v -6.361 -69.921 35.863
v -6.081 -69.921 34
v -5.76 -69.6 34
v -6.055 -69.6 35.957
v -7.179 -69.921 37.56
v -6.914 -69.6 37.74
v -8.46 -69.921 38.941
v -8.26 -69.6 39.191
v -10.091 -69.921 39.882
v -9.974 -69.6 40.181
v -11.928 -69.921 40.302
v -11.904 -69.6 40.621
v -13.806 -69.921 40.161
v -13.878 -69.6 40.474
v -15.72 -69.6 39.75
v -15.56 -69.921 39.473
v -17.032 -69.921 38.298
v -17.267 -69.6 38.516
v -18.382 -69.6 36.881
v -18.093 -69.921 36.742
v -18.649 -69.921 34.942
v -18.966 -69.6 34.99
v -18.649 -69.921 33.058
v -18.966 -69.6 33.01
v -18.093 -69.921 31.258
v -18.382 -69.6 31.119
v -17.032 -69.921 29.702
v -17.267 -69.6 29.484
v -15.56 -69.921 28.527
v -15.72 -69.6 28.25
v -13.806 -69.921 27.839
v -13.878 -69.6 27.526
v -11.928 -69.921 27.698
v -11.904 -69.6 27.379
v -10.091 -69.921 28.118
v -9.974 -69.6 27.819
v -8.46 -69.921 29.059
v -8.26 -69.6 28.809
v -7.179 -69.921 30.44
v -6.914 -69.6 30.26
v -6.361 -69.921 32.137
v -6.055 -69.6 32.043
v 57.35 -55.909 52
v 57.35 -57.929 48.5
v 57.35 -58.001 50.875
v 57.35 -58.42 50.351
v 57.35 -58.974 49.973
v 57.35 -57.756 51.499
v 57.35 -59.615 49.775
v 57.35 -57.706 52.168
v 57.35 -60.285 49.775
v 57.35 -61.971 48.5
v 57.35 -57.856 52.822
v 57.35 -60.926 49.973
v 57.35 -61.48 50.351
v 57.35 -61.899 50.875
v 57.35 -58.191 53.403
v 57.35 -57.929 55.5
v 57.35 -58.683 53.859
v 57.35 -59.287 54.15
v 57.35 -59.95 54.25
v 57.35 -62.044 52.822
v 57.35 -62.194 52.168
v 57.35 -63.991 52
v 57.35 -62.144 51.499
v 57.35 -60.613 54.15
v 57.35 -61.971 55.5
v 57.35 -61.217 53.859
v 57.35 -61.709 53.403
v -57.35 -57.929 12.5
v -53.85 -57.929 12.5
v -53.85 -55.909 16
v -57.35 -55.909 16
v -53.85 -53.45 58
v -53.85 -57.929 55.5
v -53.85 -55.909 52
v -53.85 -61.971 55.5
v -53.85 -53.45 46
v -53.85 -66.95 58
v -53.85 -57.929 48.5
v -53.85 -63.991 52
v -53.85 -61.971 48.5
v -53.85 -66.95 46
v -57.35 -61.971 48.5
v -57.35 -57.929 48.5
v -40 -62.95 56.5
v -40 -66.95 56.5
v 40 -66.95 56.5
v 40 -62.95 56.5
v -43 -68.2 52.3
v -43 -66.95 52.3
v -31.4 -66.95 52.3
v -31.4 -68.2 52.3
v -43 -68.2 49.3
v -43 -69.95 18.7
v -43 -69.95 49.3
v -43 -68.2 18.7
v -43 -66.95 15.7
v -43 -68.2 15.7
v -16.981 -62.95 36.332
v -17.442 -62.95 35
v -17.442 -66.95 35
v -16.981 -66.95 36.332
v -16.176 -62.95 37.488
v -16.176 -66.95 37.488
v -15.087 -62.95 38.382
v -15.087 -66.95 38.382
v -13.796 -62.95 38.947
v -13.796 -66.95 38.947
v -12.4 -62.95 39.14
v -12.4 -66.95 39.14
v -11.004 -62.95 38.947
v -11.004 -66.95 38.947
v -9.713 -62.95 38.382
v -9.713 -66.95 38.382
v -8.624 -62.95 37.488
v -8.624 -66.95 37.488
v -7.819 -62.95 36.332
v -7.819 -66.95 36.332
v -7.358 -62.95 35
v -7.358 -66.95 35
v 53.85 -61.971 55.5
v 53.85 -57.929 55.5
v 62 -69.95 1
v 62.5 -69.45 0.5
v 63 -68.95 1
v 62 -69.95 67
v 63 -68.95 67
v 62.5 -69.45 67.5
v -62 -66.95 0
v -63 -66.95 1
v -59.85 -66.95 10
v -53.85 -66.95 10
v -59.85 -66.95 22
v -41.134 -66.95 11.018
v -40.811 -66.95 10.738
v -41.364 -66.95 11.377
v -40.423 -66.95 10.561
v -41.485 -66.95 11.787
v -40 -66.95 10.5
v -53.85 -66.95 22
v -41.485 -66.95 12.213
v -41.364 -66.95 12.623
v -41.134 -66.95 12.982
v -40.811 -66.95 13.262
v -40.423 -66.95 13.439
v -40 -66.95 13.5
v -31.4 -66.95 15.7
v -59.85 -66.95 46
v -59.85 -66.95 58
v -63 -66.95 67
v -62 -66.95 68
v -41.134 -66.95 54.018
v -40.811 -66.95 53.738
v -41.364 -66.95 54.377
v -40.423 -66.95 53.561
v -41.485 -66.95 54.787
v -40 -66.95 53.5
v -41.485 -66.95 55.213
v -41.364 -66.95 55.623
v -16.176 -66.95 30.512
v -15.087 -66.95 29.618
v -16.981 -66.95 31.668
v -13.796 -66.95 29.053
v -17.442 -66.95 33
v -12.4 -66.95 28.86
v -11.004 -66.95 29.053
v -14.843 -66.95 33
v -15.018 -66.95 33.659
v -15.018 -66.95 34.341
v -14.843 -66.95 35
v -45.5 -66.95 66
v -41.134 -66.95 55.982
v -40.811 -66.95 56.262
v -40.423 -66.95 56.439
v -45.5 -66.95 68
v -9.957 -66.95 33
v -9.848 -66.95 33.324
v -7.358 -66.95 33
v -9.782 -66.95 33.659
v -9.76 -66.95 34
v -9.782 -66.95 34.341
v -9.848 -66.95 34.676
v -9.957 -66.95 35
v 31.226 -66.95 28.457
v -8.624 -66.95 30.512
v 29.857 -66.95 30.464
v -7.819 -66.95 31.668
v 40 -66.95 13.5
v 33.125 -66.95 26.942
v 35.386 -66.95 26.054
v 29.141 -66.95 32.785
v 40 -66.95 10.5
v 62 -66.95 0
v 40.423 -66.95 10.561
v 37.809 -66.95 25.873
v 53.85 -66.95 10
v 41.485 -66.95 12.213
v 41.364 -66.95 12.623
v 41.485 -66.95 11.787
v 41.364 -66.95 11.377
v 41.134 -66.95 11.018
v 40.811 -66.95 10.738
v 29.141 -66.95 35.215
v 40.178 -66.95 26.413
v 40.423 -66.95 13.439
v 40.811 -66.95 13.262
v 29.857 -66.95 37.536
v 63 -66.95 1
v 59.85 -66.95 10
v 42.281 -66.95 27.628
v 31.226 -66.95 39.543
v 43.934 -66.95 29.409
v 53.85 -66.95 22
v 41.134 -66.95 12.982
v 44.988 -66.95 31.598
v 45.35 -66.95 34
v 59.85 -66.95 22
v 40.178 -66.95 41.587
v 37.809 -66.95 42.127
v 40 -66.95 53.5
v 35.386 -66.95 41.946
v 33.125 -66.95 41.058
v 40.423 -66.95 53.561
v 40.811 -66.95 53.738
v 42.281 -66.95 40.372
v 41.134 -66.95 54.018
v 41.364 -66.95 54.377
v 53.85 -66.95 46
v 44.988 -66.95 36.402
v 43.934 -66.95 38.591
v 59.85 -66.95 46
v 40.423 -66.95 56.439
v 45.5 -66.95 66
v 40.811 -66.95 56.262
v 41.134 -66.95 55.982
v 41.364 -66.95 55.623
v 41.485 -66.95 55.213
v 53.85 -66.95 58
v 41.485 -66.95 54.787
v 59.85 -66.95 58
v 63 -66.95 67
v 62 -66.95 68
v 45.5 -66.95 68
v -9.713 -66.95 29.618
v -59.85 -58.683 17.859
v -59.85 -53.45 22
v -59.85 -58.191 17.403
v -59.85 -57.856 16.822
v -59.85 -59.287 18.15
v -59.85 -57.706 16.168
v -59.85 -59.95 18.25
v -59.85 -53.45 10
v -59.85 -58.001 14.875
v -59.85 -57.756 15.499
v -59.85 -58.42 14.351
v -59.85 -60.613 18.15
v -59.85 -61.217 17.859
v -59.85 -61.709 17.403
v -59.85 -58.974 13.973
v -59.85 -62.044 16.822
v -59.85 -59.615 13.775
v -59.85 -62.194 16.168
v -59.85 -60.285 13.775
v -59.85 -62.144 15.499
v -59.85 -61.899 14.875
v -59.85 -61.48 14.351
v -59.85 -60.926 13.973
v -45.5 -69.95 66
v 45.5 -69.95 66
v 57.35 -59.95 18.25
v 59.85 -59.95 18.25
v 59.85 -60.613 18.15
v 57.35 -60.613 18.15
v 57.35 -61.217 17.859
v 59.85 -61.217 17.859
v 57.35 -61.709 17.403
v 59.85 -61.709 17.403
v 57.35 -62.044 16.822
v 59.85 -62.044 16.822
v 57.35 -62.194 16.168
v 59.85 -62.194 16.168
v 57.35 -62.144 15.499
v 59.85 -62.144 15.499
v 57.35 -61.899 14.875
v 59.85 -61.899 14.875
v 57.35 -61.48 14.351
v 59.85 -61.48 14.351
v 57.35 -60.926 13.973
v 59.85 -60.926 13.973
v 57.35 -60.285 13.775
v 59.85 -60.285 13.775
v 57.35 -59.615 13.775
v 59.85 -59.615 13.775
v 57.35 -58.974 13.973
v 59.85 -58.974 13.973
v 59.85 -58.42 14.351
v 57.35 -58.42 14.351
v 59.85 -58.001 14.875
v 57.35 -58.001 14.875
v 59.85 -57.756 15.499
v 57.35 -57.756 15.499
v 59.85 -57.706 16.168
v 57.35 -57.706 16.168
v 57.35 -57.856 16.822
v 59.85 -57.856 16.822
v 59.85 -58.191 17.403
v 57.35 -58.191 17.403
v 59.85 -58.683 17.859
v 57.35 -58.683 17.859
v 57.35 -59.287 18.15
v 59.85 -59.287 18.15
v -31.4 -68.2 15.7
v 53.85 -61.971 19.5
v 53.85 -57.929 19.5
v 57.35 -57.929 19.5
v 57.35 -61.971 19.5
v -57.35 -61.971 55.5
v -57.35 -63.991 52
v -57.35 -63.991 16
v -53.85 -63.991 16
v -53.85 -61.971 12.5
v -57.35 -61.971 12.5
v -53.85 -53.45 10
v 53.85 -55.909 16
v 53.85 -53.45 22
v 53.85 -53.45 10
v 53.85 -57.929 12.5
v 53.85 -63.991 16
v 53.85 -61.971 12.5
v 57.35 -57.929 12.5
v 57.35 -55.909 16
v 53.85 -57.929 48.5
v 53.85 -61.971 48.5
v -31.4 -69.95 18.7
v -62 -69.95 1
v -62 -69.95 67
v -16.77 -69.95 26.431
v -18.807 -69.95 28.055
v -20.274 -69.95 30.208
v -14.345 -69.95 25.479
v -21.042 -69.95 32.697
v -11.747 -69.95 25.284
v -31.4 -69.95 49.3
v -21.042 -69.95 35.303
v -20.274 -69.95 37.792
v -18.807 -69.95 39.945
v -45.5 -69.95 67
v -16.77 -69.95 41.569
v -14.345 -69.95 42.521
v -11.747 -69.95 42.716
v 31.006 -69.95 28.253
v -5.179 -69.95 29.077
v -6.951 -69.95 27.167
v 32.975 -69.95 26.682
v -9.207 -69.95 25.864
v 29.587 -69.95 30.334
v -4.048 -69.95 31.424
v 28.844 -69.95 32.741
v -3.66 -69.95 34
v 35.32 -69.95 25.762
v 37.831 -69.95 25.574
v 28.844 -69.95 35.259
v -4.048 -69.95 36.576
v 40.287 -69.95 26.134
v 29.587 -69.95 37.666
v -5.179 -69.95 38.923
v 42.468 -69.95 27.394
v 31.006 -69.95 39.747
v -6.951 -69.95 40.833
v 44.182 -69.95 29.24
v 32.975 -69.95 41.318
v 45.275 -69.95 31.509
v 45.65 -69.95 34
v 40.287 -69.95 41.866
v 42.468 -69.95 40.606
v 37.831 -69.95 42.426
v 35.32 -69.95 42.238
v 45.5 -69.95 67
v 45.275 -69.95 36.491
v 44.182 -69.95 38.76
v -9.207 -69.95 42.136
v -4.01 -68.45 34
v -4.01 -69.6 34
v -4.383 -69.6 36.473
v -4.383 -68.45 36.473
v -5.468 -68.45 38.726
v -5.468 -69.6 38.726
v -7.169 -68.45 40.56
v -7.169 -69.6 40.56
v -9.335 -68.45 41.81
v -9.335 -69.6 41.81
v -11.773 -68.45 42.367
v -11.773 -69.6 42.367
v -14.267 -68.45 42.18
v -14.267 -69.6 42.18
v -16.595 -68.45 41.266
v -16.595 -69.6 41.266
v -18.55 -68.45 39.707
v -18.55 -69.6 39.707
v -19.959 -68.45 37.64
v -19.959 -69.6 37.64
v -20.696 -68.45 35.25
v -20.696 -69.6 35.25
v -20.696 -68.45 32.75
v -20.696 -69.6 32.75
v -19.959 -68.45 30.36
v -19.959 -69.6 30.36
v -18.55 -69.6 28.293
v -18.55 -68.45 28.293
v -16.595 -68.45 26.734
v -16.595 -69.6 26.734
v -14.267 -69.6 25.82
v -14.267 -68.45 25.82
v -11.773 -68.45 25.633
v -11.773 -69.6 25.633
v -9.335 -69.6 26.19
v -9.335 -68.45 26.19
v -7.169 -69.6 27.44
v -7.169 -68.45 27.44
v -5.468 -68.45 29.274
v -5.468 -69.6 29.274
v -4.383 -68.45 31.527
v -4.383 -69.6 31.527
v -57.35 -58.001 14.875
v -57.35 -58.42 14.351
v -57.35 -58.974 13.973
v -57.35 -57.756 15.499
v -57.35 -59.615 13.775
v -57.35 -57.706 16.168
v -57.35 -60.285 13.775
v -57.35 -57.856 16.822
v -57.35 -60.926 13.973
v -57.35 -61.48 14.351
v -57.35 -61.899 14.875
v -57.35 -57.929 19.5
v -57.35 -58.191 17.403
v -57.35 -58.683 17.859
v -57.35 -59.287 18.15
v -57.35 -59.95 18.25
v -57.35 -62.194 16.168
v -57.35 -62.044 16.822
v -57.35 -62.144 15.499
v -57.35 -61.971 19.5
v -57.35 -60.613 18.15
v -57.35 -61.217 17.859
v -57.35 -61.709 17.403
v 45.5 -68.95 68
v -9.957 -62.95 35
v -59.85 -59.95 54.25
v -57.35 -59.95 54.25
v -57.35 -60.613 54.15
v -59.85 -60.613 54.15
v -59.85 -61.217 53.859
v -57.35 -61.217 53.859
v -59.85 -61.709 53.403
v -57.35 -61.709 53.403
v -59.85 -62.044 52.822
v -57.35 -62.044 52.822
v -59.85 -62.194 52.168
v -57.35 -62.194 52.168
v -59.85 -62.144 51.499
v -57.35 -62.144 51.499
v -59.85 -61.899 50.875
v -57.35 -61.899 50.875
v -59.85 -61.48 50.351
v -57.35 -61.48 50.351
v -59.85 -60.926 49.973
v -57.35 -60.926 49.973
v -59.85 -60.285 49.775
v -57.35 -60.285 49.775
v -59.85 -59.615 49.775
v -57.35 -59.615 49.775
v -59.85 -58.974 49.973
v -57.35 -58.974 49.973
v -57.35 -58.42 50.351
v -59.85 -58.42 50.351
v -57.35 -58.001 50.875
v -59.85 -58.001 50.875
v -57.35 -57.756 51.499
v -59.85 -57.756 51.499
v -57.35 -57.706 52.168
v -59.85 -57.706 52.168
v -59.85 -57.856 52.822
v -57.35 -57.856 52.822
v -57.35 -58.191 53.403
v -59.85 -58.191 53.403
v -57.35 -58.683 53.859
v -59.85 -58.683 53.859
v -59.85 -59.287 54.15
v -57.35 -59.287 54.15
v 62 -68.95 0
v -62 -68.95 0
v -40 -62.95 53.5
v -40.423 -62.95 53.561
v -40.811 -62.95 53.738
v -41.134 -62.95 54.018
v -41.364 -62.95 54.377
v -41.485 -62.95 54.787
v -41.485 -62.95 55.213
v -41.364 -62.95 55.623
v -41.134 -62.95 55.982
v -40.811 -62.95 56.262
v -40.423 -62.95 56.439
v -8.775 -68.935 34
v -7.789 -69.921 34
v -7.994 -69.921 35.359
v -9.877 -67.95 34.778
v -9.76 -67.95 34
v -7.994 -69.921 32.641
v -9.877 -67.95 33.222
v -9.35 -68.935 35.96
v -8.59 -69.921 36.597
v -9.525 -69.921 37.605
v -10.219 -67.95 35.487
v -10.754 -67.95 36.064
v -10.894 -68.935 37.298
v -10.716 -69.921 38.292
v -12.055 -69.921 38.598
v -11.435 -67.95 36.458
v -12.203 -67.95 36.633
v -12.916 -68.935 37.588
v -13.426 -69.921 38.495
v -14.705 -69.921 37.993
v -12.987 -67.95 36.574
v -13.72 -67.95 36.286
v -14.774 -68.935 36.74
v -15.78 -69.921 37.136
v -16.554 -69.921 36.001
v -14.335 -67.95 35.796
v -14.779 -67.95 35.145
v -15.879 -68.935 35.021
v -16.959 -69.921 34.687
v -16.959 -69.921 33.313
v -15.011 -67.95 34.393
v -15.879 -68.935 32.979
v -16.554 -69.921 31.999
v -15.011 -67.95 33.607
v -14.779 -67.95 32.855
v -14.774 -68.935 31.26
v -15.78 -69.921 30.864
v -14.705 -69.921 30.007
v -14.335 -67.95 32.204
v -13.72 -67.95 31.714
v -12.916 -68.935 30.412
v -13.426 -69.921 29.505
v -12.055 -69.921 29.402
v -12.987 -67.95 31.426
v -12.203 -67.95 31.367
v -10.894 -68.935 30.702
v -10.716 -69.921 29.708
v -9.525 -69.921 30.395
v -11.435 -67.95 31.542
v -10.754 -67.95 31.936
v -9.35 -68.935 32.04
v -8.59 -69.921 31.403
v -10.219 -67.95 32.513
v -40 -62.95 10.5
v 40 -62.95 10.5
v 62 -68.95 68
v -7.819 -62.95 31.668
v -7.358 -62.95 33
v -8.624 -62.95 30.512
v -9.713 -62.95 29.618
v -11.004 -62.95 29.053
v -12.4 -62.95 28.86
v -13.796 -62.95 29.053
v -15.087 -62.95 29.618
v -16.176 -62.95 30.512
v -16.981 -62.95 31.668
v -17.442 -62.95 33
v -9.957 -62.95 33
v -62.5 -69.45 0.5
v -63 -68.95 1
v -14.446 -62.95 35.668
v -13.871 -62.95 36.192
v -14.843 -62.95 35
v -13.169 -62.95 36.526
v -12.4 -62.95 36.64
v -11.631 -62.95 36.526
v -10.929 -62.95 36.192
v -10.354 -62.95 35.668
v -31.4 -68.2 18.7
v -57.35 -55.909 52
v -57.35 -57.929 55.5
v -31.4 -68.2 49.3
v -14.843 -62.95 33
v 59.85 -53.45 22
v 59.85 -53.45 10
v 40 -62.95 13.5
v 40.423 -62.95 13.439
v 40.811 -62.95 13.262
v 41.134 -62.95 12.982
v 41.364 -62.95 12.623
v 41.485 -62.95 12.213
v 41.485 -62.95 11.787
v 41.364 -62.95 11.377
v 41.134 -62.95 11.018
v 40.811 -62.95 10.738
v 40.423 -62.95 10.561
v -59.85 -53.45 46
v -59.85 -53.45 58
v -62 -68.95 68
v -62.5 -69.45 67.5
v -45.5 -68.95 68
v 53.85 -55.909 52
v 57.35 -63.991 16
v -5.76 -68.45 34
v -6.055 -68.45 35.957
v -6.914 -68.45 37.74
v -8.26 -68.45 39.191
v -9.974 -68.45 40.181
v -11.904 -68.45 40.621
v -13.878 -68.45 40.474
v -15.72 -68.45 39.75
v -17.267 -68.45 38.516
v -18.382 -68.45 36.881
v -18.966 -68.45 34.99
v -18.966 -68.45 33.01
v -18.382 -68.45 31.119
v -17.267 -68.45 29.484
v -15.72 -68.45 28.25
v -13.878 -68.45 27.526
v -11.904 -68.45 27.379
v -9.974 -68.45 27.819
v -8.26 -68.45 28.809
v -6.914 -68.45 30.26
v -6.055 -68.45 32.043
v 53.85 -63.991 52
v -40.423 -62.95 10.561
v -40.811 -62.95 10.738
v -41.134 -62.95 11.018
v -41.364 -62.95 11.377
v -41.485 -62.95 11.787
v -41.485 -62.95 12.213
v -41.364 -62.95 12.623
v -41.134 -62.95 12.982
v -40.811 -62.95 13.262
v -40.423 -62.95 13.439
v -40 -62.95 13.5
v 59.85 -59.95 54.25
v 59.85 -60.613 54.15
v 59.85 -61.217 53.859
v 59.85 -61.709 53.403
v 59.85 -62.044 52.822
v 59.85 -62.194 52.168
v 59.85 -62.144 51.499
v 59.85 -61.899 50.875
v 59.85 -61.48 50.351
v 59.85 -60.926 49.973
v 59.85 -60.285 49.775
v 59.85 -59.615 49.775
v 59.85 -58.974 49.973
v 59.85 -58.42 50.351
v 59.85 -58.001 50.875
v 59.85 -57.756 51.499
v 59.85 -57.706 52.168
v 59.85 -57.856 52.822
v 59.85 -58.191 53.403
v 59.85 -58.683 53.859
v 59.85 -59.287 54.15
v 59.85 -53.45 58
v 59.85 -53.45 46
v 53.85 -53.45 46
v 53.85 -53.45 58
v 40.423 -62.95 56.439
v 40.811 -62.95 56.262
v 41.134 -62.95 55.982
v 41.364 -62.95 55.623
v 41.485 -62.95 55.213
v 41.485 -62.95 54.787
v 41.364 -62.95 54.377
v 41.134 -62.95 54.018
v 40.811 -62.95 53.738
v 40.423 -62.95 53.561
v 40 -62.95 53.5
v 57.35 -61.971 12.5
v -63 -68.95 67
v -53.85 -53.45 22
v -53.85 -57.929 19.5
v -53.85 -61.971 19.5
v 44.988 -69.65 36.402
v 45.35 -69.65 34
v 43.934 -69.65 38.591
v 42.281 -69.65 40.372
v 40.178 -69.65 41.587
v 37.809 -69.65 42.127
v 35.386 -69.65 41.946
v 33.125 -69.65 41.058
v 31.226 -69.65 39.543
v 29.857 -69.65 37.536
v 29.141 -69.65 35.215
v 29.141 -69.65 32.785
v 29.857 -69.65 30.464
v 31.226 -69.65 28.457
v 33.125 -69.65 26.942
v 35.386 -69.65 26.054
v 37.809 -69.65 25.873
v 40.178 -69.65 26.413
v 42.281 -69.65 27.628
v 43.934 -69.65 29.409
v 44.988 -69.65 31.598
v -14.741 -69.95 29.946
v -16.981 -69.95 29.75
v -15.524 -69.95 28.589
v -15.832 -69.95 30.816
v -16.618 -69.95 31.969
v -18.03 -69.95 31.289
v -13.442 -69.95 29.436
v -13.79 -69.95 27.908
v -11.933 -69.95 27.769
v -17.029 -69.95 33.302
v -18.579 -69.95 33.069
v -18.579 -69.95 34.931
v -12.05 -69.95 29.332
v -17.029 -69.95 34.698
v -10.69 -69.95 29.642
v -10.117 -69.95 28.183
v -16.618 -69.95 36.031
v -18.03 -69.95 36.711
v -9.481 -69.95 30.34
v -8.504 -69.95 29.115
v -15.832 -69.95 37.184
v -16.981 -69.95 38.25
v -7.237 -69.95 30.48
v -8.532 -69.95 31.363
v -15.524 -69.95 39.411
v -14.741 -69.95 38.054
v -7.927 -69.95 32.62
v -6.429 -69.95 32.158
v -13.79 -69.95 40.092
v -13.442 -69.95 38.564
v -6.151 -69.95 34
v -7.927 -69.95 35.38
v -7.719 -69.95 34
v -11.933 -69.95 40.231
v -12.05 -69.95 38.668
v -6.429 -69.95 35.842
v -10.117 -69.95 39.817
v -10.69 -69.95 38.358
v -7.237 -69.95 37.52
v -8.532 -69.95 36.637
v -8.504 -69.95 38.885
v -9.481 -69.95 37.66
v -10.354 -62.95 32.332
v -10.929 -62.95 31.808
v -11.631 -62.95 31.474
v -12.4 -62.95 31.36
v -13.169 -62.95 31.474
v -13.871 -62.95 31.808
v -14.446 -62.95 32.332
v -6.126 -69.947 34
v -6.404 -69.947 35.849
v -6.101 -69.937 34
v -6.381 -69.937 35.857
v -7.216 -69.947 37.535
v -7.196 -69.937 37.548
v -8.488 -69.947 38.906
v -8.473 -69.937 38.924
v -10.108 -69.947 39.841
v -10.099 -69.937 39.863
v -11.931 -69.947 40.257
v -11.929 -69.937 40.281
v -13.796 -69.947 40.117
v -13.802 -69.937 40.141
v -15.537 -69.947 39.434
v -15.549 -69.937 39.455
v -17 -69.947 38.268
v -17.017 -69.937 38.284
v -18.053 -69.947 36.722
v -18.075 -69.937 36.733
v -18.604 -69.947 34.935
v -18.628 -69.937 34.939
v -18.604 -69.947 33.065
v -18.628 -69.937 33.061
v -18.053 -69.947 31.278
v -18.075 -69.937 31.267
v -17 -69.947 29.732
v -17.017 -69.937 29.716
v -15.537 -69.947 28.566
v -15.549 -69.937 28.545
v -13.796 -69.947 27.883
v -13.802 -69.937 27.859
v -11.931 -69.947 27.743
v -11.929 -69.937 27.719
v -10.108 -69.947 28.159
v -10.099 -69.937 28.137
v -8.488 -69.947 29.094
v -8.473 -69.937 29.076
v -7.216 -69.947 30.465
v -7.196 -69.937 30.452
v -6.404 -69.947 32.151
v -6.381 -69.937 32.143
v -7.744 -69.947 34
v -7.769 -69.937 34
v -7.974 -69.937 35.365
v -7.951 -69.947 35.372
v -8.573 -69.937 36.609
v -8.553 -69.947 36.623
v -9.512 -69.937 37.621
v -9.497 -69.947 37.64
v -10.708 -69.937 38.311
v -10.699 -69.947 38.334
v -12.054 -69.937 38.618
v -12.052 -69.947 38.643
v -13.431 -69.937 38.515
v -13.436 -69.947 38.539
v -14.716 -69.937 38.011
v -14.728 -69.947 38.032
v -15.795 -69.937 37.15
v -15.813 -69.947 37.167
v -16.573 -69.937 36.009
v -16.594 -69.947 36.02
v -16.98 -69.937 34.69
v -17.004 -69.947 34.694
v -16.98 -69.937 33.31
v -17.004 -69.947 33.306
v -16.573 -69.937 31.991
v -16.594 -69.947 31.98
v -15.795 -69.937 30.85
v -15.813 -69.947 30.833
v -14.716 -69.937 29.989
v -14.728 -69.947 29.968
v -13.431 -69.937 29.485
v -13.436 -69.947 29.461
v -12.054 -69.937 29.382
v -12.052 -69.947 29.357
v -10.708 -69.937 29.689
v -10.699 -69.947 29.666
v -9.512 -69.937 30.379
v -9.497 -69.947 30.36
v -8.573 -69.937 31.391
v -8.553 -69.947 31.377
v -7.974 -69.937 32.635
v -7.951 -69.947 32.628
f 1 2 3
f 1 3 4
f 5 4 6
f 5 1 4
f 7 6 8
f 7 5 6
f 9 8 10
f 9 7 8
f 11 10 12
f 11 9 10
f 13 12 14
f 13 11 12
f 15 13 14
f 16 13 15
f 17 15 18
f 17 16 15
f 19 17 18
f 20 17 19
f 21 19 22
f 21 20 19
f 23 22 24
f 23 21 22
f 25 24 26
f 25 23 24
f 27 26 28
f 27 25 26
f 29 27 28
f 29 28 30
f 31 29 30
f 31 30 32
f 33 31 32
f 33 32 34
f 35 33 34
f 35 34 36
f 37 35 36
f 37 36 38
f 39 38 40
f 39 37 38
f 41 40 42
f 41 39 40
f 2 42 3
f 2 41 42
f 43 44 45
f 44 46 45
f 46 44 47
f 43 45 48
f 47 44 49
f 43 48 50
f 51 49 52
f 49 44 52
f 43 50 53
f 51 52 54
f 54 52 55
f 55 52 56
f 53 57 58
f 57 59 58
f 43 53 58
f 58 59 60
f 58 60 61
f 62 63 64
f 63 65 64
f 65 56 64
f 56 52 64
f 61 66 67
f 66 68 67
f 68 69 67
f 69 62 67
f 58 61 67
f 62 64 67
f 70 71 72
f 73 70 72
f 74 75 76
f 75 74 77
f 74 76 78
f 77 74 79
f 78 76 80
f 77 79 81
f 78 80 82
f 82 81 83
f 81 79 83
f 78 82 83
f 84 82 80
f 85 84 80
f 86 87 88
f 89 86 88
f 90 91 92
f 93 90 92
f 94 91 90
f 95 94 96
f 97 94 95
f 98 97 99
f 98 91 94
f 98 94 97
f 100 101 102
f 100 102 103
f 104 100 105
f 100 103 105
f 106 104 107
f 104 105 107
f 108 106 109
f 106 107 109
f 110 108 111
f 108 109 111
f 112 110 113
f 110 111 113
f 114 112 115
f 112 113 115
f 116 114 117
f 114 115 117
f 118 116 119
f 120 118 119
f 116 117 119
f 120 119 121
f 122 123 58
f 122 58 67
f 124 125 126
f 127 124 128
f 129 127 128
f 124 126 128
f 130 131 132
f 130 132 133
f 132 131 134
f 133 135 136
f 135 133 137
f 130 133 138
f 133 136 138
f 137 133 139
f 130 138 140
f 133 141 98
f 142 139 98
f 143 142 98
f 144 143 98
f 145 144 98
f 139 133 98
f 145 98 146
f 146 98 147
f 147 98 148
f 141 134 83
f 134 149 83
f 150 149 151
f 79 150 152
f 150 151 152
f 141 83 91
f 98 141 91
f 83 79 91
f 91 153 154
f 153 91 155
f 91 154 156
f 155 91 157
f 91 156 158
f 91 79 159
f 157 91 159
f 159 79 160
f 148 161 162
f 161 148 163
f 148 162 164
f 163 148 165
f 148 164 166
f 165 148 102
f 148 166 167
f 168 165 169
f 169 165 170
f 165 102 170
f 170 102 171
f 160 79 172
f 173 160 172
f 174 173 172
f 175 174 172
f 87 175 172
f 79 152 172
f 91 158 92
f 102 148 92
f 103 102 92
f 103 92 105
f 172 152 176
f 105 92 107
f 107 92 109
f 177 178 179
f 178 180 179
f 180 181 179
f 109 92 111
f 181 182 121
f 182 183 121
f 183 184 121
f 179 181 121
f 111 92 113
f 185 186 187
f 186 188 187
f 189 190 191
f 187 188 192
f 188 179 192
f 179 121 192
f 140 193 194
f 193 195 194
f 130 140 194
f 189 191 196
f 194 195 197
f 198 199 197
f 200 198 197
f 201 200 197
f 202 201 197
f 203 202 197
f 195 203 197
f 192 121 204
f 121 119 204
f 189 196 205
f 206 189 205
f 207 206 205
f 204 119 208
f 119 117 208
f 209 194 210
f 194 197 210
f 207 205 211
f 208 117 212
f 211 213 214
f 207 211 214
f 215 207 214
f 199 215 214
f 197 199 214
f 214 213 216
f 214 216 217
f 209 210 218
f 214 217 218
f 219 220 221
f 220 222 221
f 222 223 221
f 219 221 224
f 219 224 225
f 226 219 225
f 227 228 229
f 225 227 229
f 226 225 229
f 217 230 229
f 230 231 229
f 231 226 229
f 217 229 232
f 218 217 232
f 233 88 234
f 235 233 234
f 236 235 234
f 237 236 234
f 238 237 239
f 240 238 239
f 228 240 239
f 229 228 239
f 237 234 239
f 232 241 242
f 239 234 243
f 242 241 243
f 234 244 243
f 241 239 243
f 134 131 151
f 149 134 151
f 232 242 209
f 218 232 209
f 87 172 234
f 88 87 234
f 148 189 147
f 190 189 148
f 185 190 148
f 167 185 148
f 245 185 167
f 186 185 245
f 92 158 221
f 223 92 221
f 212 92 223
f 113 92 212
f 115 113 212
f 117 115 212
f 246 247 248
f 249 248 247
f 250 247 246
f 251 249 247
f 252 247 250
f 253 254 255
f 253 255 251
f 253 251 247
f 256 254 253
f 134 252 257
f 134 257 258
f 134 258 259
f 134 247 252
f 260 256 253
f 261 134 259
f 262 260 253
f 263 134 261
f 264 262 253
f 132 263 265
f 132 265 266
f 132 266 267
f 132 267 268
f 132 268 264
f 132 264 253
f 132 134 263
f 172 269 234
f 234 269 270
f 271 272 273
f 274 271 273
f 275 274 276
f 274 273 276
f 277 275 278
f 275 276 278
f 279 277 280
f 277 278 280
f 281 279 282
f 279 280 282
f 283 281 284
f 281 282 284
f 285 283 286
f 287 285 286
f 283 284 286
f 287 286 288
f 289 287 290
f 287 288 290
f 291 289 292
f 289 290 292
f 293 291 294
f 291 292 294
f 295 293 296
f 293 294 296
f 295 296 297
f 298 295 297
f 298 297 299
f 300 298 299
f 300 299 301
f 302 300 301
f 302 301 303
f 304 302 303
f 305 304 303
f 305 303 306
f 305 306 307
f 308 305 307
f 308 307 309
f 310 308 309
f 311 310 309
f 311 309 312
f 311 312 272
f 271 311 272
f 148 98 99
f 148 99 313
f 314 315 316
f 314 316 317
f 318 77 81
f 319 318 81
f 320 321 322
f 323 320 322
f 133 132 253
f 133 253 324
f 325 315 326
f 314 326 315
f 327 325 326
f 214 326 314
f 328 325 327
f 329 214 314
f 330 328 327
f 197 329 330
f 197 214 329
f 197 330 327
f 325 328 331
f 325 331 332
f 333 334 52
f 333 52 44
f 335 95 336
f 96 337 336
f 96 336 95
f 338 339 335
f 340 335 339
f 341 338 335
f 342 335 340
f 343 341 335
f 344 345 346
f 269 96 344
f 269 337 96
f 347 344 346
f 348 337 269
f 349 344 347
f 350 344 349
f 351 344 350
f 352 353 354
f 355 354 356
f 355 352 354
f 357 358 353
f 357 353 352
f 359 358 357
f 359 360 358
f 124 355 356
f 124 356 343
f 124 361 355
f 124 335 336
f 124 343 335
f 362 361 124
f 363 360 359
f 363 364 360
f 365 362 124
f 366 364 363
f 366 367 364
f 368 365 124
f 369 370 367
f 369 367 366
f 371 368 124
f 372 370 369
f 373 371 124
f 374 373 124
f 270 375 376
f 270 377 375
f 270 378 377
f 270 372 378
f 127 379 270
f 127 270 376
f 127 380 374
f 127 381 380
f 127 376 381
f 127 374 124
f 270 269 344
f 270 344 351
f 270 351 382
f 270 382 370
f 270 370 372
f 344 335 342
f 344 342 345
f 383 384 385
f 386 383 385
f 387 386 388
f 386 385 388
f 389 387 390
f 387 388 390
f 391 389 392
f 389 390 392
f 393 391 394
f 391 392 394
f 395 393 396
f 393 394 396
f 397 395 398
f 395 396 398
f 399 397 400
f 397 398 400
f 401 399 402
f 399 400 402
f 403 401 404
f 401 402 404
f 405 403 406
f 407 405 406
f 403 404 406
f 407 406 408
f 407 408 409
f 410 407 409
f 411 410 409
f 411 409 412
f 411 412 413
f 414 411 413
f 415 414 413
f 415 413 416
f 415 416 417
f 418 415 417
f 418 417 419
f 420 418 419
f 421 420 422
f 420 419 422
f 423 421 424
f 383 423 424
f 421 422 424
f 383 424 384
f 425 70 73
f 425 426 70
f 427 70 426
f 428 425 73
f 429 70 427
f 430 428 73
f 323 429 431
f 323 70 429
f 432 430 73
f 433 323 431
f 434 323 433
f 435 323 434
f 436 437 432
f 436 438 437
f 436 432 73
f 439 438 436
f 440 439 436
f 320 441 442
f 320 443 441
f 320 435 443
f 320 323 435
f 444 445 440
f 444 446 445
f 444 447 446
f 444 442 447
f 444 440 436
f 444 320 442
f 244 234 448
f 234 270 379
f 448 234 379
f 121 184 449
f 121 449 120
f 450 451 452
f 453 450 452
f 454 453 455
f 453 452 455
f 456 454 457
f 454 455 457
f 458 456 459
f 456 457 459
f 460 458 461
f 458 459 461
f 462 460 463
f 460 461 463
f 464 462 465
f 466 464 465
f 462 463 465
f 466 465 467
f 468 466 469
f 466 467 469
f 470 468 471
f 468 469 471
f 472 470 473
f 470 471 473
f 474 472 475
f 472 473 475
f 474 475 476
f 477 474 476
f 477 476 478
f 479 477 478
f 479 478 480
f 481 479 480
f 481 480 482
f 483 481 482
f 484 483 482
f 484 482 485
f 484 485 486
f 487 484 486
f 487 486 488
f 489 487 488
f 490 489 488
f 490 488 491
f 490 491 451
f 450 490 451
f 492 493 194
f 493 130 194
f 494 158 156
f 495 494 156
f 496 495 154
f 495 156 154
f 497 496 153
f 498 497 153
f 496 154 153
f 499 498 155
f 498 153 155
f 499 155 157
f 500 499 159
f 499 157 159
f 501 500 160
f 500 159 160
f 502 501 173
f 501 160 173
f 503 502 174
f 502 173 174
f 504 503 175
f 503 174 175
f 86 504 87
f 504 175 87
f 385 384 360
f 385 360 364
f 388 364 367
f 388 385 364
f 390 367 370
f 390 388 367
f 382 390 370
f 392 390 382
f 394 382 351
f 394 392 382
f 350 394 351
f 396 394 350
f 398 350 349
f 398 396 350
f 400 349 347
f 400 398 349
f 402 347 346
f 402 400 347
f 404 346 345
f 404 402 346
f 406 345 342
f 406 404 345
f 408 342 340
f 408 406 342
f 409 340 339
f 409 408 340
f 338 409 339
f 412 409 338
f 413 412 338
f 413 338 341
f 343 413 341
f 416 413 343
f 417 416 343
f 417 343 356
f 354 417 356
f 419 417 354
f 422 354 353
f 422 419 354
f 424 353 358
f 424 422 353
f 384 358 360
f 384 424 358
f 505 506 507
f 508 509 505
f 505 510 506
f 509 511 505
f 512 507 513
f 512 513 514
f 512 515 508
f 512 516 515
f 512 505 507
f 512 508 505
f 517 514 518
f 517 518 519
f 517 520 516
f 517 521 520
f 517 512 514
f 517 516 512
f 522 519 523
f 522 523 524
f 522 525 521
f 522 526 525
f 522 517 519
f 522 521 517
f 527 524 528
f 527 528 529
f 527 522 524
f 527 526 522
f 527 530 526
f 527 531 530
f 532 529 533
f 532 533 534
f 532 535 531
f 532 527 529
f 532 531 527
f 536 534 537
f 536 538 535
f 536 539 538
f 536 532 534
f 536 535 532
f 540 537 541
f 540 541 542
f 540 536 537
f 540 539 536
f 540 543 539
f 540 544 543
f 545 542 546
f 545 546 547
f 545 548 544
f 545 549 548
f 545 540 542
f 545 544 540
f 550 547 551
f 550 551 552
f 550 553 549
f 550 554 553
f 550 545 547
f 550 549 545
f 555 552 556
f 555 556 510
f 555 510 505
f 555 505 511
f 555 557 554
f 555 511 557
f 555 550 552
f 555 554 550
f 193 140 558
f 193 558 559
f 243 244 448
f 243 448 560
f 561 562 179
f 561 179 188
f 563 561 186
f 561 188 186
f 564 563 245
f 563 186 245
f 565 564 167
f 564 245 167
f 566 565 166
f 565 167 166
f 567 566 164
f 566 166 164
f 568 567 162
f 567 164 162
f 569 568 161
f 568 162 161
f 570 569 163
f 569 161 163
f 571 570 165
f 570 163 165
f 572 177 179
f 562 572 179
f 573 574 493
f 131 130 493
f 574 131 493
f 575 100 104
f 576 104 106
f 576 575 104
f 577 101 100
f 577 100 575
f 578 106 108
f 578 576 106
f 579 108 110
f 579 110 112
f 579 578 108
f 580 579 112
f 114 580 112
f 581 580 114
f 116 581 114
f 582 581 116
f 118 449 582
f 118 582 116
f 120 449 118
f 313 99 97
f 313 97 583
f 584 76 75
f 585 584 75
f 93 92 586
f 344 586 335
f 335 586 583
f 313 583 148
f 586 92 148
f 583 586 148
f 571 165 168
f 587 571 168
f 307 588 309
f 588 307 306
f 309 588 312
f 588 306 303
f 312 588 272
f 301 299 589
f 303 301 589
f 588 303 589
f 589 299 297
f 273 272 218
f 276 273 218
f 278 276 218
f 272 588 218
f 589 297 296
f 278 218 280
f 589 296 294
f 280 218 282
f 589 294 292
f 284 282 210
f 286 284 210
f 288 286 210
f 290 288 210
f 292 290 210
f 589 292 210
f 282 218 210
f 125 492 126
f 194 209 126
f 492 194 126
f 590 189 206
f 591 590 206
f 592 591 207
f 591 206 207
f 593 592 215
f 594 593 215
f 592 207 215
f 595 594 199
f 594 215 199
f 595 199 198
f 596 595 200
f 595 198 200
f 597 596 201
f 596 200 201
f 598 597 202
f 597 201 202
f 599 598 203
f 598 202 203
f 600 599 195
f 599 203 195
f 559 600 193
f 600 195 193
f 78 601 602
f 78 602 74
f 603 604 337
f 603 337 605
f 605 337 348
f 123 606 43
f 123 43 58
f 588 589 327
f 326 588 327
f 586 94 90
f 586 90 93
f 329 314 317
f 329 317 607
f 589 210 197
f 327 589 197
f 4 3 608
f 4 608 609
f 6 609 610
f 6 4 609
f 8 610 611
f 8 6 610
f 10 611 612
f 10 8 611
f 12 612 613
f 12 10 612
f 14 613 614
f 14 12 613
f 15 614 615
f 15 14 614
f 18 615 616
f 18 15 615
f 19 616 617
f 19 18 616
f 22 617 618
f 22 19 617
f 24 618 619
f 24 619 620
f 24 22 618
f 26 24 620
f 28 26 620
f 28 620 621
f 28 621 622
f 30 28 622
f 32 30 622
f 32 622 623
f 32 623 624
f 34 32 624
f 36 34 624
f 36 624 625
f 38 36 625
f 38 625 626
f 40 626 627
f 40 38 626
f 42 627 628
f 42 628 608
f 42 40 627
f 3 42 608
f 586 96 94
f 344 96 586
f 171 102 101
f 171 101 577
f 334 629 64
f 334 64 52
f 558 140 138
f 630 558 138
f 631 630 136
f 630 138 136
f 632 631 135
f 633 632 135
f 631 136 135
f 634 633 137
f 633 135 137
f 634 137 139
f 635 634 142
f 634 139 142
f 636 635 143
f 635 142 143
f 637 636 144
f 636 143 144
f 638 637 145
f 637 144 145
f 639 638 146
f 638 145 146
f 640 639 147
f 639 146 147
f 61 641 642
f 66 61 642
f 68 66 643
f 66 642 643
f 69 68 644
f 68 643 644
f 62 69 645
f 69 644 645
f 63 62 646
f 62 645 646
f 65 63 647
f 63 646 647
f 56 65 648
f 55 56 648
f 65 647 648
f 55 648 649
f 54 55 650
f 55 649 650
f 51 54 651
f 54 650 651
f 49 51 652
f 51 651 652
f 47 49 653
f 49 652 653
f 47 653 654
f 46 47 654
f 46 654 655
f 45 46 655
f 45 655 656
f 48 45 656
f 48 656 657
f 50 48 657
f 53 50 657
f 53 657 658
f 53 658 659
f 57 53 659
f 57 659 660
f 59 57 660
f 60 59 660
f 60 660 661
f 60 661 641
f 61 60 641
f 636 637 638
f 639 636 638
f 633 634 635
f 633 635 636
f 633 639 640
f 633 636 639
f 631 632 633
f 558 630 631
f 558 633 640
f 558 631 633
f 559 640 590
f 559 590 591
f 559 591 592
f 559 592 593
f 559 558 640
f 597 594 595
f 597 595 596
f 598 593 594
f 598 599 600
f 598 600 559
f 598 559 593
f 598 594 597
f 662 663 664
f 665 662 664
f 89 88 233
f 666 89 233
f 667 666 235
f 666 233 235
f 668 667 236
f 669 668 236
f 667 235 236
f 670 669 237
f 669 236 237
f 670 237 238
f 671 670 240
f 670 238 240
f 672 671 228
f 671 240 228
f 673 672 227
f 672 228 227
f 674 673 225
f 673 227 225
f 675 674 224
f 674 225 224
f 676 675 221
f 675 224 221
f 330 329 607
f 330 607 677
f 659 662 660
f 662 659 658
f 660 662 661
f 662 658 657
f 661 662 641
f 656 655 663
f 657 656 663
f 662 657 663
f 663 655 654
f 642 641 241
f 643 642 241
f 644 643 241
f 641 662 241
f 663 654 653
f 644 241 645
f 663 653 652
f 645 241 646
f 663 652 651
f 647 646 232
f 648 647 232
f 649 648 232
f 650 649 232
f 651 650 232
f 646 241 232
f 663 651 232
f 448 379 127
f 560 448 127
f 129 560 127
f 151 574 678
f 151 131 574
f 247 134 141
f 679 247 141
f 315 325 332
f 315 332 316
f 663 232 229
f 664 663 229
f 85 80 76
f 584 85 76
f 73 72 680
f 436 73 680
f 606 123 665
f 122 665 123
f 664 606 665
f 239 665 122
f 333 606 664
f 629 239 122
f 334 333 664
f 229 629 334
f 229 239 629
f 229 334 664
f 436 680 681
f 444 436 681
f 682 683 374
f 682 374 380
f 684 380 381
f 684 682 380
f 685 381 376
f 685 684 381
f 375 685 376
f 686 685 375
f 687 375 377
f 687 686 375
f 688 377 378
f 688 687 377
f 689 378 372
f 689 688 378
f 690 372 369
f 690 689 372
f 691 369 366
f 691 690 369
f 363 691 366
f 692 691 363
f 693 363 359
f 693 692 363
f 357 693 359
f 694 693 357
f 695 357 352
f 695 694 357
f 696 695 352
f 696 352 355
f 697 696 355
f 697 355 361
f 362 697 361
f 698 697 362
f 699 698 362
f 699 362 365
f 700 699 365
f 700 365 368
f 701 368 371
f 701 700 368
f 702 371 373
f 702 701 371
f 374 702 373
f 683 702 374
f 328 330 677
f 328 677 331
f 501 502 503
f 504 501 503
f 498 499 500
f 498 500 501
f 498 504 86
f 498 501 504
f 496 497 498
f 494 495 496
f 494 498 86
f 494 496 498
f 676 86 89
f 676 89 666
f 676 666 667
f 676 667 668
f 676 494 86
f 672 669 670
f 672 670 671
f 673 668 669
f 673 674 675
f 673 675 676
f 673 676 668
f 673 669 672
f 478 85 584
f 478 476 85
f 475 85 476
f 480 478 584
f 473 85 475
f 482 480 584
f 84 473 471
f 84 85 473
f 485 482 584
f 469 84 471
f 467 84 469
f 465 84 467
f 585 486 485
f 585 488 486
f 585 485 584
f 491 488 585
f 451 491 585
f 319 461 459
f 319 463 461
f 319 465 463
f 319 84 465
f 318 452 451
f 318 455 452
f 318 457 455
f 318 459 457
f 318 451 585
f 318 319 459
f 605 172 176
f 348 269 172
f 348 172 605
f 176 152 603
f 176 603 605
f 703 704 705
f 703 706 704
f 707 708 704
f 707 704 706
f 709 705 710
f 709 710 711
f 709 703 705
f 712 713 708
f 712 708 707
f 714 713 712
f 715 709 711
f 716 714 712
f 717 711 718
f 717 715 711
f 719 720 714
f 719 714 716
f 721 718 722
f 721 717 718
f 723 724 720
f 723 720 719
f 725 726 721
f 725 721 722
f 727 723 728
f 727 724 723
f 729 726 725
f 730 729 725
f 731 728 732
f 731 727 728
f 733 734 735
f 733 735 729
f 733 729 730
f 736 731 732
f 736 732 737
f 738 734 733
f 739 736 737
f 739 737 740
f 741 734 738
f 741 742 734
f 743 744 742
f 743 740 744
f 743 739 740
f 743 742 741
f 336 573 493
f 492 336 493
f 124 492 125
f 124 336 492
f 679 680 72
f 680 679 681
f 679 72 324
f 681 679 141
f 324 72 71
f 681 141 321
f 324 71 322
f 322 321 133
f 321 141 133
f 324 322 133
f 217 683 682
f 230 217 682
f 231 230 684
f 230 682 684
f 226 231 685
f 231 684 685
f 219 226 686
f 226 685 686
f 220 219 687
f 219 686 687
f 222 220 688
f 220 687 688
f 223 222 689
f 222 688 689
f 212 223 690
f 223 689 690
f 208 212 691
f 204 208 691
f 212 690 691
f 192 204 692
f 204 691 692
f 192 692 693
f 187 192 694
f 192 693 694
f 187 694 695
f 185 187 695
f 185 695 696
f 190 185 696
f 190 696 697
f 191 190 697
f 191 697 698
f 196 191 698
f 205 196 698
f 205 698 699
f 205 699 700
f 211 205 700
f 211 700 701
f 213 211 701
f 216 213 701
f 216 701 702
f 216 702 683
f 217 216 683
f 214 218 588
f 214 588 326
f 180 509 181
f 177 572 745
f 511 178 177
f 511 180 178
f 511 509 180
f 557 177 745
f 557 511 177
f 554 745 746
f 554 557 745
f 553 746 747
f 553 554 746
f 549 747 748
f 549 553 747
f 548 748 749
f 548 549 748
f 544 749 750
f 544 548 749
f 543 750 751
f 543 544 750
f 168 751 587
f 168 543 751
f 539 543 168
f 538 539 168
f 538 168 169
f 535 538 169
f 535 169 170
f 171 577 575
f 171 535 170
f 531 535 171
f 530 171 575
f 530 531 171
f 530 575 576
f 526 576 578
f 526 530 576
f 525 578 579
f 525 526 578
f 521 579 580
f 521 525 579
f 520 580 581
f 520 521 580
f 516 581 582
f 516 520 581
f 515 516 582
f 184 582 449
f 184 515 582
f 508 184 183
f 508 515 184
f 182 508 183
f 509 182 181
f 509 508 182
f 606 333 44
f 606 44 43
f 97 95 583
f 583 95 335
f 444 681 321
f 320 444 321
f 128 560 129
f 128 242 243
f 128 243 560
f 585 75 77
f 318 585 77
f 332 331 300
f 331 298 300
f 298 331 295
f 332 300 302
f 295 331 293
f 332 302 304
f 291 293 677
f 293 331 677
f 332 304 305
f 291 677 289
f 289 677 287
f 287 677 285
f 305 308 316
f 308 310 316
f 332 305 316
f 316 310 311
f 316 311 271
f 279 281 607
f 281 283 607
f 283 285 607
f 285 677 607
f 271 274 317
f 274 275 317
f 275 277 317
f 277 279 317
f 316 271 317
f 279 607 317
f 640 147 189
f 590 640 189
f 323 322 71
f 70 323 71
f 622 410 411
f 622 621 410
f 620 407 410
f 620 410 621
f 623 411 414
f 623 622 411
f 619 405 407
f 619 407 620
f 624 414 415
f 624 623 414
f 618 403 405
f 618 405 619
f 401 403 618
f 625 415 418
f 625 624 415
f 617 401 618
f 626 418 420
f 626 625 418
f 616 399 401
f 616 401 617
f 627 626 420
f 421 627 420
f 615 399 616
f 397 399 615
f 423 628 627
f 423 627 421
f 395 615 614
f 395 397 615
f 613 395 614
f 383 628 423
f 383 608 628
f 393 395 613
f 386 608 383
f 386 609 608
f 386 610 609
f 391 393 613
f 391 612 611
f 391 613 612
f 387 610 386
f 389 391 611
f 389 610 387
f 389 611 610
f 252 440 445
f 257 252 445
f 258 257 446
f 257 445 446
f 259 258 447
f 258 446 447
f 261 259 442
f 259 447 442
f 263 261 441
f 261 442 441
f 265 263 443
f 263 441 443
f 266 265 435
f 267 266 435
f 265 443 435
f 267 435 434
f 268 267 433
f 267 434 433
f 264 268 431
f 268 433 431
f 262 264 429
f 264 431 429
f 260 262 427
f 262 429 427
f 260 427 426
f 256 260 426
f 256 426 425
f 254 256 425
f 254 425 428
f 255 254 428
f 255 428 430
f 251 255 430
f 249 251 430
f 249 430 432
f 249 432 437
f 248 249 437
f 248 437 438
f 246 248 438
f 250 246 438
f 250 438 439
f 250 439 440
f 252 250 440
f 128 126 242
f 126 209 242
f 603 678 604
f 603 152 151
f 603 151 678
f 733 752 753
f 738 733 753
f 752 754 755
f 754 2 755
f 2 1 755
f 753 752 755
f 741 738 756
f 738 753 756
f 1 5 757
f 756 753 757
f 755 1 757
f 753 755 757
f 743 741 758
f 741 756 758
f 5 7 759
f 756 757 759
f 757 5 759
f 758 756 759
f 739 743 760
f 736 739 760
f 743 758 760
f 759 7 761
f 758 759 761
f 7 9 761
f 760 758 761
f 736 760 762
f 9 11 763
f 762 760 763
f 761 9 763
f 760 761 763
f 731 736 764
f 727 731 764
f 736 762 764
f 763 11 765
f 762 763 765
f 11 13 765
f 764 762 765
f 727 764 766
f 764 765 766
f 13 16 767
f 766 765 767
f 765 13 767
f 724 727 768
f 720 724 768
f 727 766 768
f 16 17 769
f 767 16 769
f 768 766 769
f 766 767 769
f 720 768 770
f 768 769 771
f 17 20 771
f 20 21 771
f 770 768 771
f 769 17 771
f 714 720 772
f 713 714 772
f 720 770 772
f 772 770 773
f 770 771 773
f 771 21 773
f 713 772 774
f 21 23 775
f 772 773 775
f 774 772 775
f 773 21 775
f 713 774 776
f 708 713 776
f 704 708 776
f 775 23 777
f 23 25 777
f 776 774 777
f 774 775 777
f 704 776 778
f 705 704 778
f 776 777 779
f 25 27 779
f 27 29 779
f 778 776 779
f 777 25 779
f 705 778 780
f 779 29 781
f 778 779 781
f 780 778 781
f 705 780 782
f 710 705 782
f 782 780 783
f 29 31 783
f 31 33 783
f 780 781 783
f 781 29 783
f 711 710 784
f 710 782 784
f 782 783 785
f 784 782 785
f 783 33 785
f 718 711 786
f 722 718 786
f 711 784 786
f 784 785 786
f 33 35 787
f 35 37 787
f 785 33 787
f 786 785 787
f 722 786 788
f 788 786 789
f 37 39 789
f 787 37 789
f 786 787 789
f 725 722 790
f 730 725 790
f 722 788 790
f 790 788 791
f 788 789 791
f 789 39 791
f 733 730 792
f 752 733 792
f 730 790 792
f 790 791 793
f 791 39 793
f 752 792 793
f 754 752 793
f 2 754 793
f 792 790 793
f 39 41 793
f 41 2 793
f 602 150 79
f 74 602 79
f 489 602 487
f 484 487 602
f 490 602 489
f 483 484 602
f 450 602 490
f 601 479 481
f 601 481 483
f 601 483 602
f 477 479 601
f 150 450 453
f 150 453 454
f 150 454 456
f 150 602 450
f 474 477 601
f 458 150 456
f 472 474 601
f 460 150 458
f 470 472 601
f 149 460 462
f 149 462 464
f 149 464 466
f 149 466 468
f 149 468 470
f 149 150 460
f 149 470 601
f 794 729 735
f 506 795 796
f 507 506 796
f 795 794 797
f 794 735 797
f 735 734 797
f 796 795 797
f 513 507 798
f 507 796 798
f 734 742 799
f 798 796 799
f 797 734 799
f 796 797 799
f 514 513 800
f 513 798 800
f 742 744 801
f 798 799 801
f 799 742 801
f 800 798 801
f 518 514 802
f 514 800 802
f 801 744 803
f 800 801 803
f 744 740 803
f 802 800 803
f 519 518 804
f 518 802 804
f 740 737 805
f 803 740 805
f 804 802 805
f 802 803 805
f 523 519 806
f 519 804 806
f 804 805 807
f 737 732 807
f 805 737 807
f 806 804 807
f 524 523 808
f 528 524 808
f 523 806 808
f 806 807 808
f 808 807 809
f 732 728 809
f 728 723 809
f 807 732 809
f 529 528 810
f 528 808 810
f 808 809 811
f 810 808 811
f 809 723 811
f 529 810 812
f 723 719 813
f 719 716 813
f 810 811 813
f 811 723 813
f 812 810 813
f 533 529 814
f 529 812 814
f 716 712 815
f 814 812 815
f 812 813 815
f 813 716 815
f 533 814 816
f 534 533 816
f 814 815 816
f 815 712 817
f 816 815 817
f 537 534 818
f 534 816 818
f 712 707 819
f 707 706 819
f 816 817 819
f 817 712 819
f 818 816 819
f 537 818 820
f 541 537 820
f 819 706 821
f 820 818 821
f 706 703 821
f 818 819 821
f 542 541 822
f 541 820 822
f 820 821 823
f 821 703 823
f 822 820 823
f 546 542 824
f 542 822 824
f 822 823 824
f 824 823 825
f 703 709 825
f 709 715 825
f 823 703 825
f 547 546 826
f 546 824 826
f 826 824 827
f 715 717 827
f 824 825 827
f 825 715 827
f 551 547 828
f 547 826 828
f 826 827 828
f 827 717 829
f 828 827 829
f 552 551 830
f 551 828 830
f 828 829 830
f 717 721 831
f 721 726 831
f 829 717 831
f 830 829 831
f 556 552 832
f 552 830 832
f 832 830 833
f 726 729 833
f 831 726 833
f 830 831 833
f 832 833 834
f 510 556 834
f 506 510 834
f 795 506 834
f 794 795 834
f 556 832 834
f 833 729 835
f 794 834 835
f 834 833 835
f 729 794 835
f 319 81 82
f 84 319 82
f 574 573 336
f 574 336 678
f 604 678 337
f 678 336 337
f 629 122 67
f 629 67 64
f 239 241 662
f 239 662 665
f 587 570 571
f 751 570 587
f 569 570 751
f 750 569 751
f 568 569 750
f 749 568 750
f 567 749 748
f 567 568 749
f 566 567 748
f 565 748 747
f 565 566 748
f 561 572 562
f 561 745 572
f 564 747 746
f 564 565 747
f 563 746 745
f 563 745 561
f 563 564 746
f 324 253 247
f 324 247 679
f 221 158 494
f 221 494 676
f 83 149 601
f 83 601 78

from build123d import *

# Parameters (mm, degrees)
SKETCH011_W     = 126
SKETCH011_H     = 68
PAD006_DEPTH    = 3
SKETCH012_W     = 6
SKETCH012_H     = 12
PAD007_DEPTH    = 13.5
SKETCH013_R     = 2.25
POCKET004_DEPTH = 122.851
POCKET005_DEPTH = 3.5
CHAMFER004_SIZE = 1
CHAMFER005_SIZE = 1
CHAMFER008_SIZE = 1
SKETCH024_R     = 2.64
SKETCH024_R_2   = 8.15
SKETCH024_W     = 7.05
SKETCH024_H     = 19.25
POCKET012_DEPTH = 16.501
POCKET013_DEPTH = 1
CHAMFER010_SIZE = 2
SKETCH026_R     = 8.39
SKETCH026_R_2   = 6.64
POCKET014_DEPTH = 1.5
CHAMFER011_SIZE = 0.35
CHAMFER012_SIZE = 0.3
SKETCH030_R     = 5.14
SKETCH030_R_2   = 2.64
PAD012_DEPTH    = 4
SKETCH031_W     = 10.28
SKETCH031_H     = 2
POCKET016_DEPTH = 4
PAD016_DEPTH    = 4
FILLET004_R     = 0.1
SKETCH053_W     = 91
SKETCH053_H     = 2
POCKET028_DEPTH = 16.501
SKETCH054_W     = 11.6
SKETCH054_H     = 30.6
POCKET029_DEPTH = 16.501
SKETCH055_W     = 11.6
SKETCH055_H     = 36.6
POCKET030_DEPTH = 1.25


with BuildPart() as part:
    # Sketch011 → Pad006 (new body)
    with BuildSketch(Plane.XZ):
        with Locations((0, 34)):
            Rectangle(SKETCH011_W, SKETCH011_H)
    extrude(amount=PAD006_DEPTH)

    # Sketch012 (on Face5 of Pad006) → Pad007 (join)
    with BuildSketch(Plane(origin=(0, 0, 0), x_dir=(1, 0, 0), z_dir=(0, 1, 0))):
        with Locations((-56.85, -16)):
            Rectangle(SKETCH012_W, SKETCH012_H)
        with Locations((-56.85, -52)):
            Rectangle(SKETCH012_W, SKETCH012_H)
    pad007 = extrude(amount=PAD007_DEPTH)

    # Mirrored002: Pad007 across YZ
    add(pad007.mirror(Plane.YZ))

    # Sketch013 (on Face22 of Mirrored002) → Pocket004 (cut, through all)
    with BuildSketch(Plane(origin=(59.85, 0, 0), x_dir=(0, 0, 1), z_dir=(1, 0, 0))):
        with Locations((16, -7)):
            Circle(SKETCH013_R)
        with Locations((52, -7)):
            Circle(SKETCH013_R)
    extrude(amount=-POCKET004_DEPTH, mode=Mode.SUBTRACT)

    # Sketch014 (on Face10 of Pocket004) → Pocket005 (cut)
    with BuildSketch(Plane(origin=(-53.85, 0, 0), x_dir=(0, 0, 1), z_dir=(1, 0, 0))):
        Polygon((19.5, -9.020726), (19.5, -4.979274), (16, -2.958548), (12.5, -4.979274), (12.5, -9.020726), (16, -11.041452), align=None)
        Polygon((55.5, -9.020726), (55.5, -4.979274), (52, -2.958548), (48.5, -4.979274), (48.5, -9.020726), (52, -11.041452), align=None)
    pocket005 = extrude(amount=-POCKET005_DEPTH, mode=Mode.SUBTRACT)

    # Chamfer004
    chamfer004_edges = [part.edges().sort_by_distance(p)[0] for p in [
        (0, -3, 68),
        (63, -3, 34),
        (0, -3, 0),
        (-63, -3, 34),
    ]]
    chamfer(chamfer004_edges, length=CHAMFER004_SIZE)

    # Chamfer005
    chamfer005_edges = [part.edges().sort_by_distance(p)[0] for p in [
        (-63, -1, 68),
        (63, -1, 68),
    ]]
    chamfer(chamfer005_edges, length=CHAMFER005_SIZE)

    # Chamfer008
    chamfer008_edges = [part.edges().sort_by_distance(p)[0] for p in [
        (63, -1, 0),
        (-63, -1, 0),
    ]]
    chamfer(chamfer008_edges, length=CHAMFER008_SIZE)

    # Mirrored005: Pocket005 across YZ
    add(pocket005.mirror(Plane.YZ), mode=Mode.SUBTRACT)

    # Sketch024 (on Face62 of Mirrored005) → Pocket012 (cut, through all)
    with BuildSketch(Plane.XZ.offset(3)):
        with Locations((-12.4, 34)):
            Circle(SKETCH024_R)
        with Locations((37.2, 34)):
            Circle(SKETCH024_R_2)
        with Locations((-37.2, 34)):
            Rectangle(SKETCH024_W, SKETCH024_H)
    extrude(amount=-POCKET012_DEPTH, mode=Mode.SUBTRACT)

    # Sketch025 (on Face1 of Pocket012) → Pocket013 (cut)
    with BuildSketch(Plane(origin=(0, 0, 0), x_dir=(1, 0, 0), z_dir=(0, 1, 0))):
        Polygon((-40.725, -20.375), (-33.675, -20.375), (-33.675, -43.625), (-33.675, -47.625), (-40.725, -47.625), (-40.725, -24.375), align=None)
    extrude(amount=-POCKET013_DEPTH, mode=Mode.SUBTRACT)

    # Chamfer010
    chamfer010_edges = [part.edges().sort_by_distance(p)[0] for p in [
        (-15.04, -3, 34),
    ]]
    chamfer(chamfer010_edges, length=CHAMFER010_SIZE)

    # Sketch026 (on Face4 of Chamfer010) → Pocket014 (cut)
    with BuildSketch(Plane.XZ.offset(3)):
        with Locations((-12.4, 34)):
            Circle(SKETCH026_R)
        with Locations((-12.4, 34)):
            Circle(SKETCH026_R_2, mode=Mode.SUBTRACT)
    extrude(amount=-POCKET014_DEPTH, mode=Mode.SUBTRACT)

    # Chamfer011
    chamfer011_edges = [part.edges().sort_by_distance(p)[0] for p in [
        (-19.04, -3, 34),
        (-20.79, -3, 34),
    ]]
    chamfer(chamfer011_edges, length=CHAMFER011_SIZE)

    # Chamfer012
    chamfer012_edges = [part.edges().sort_by_distance(p)[0] for p in [
        (-37.2, -3, 24.375),
        (-40.725, -3, 34),
        (-33.675, -3, 34),
        (-37.2, -3, 43.625),
        (29.05, -3, 34),
    ]]
    chamfer(chamfer012_edges, length=CHAMFER012_SIZE)

    # Sketch030 (on Face3 of Chamfer012) → Pad012 (join)
    with BuildSketch(Plane(origin=(0, 0, 0), x_dir=(1, 0, 0), z_dir=(0, 1, 0))):
        with Locations((-12.4, -34)):
            Circle(SKETCH030_R)
        with Locations((-12.4, -34)):
            Circle(SKETCH030_R_2, mode=Mode.SUBTRACT)
    extrude(amount=PAD012_DEPTH)

    # Sketch031 (on Face83 of Pad012) → Pocket016 (cut)
    with BuildSketch(Plane(origin=(0, 4, 0), x_dir=(1, 0, 0), z_dir=(0, 1, 0))):
        with Locations((-12.4, -34)):
            Rectangle(SKETCH031_W, SKETCH031_H)
    extrude(amount=-POCKET016_DEPTH, mode=Mode.SUBTRACT)

    # Sketch035 (on Face3 of Pocket016) → Pad016 (join)
    with BuildSketch(Plane(origin=(0, 0, 0), x_dir=(1, 0, 0), z_dir=(0, 1, 0))):
        with BuildLine():
            ThreePointArc((-40, -53.5), (-41.5, -55), (-40, -56.5))
            Line((-40, -56.5), (40, -56.5))
            ThreePointArc((40, -56.5), (41.5, -55), (40, -53.5))
            Line((-40, -53.5), (40, -53.5))
        make_face()
        with BuildLine():
            ThreePointArc((-40, -10.5), (-41.5, -12), (-40, -13.5))
            Line((-40, -13.5), (40, -13.5))
            ThreePointArc((40, -13.5), (41.5, -12), (40, -10.5))
            Line((-40, -10.5), (40, -10.5))
        make_face()
    extrude(amount=PAD016_DEPTH)

    # Fillet004
    fillet004_edges = [part.edges().sort_by_distance(p)[0] for p in [
        (-18.69, -3, 34),
        (-17.04, -3, 34),
    ]]
    fillet(fillet004_edges, radius=FILLET004_R)

    # Sketch053 (on Face111 of Fillet004) → Pocket028 (cut, through all)
    with BuildSketch(Plane.XZ.offset(3)):
        with Locations((0, 67)):
            Rectangle(SKETCH053_W, SKETCH053_H)
    extrude(amount=-POCKET028_DEPTH, mode=Mode.SUBTRACT)

    # Sketch054 (on Face75 of Pocket028) → Pocket029 (cut, through all)
    with BuildSketch(Plane.XZ.offset(3)):
        with Locations((-37.2, 34)):
            Rectangle(SKETCH054_W, SKETCH054_H)
    extrude(amount=-POCKET029_DEPTH, mode=Mode.SUBTRACT)

    # Sketch055 (on Face21 of Pocket029) → Pocket030 (cut)
    with BuildSketch(Plane(origin=(0, 0, 0), x_dir=(1, 0, 0), z_dir=(0, 1, 0))):
        with Locations((-37.2, -34)):
            Rectangle(SKETCH055_W, SKETCH055_H)
    extrude(amount=-POCKET030_DEPTH, mode=Mode.SUBTRACT)


with BuildPart() as part_1:
    # Body004 placement: moved
    add(part.part.moved(Location((0, -66.95, 0))))


solid = part_1.part
